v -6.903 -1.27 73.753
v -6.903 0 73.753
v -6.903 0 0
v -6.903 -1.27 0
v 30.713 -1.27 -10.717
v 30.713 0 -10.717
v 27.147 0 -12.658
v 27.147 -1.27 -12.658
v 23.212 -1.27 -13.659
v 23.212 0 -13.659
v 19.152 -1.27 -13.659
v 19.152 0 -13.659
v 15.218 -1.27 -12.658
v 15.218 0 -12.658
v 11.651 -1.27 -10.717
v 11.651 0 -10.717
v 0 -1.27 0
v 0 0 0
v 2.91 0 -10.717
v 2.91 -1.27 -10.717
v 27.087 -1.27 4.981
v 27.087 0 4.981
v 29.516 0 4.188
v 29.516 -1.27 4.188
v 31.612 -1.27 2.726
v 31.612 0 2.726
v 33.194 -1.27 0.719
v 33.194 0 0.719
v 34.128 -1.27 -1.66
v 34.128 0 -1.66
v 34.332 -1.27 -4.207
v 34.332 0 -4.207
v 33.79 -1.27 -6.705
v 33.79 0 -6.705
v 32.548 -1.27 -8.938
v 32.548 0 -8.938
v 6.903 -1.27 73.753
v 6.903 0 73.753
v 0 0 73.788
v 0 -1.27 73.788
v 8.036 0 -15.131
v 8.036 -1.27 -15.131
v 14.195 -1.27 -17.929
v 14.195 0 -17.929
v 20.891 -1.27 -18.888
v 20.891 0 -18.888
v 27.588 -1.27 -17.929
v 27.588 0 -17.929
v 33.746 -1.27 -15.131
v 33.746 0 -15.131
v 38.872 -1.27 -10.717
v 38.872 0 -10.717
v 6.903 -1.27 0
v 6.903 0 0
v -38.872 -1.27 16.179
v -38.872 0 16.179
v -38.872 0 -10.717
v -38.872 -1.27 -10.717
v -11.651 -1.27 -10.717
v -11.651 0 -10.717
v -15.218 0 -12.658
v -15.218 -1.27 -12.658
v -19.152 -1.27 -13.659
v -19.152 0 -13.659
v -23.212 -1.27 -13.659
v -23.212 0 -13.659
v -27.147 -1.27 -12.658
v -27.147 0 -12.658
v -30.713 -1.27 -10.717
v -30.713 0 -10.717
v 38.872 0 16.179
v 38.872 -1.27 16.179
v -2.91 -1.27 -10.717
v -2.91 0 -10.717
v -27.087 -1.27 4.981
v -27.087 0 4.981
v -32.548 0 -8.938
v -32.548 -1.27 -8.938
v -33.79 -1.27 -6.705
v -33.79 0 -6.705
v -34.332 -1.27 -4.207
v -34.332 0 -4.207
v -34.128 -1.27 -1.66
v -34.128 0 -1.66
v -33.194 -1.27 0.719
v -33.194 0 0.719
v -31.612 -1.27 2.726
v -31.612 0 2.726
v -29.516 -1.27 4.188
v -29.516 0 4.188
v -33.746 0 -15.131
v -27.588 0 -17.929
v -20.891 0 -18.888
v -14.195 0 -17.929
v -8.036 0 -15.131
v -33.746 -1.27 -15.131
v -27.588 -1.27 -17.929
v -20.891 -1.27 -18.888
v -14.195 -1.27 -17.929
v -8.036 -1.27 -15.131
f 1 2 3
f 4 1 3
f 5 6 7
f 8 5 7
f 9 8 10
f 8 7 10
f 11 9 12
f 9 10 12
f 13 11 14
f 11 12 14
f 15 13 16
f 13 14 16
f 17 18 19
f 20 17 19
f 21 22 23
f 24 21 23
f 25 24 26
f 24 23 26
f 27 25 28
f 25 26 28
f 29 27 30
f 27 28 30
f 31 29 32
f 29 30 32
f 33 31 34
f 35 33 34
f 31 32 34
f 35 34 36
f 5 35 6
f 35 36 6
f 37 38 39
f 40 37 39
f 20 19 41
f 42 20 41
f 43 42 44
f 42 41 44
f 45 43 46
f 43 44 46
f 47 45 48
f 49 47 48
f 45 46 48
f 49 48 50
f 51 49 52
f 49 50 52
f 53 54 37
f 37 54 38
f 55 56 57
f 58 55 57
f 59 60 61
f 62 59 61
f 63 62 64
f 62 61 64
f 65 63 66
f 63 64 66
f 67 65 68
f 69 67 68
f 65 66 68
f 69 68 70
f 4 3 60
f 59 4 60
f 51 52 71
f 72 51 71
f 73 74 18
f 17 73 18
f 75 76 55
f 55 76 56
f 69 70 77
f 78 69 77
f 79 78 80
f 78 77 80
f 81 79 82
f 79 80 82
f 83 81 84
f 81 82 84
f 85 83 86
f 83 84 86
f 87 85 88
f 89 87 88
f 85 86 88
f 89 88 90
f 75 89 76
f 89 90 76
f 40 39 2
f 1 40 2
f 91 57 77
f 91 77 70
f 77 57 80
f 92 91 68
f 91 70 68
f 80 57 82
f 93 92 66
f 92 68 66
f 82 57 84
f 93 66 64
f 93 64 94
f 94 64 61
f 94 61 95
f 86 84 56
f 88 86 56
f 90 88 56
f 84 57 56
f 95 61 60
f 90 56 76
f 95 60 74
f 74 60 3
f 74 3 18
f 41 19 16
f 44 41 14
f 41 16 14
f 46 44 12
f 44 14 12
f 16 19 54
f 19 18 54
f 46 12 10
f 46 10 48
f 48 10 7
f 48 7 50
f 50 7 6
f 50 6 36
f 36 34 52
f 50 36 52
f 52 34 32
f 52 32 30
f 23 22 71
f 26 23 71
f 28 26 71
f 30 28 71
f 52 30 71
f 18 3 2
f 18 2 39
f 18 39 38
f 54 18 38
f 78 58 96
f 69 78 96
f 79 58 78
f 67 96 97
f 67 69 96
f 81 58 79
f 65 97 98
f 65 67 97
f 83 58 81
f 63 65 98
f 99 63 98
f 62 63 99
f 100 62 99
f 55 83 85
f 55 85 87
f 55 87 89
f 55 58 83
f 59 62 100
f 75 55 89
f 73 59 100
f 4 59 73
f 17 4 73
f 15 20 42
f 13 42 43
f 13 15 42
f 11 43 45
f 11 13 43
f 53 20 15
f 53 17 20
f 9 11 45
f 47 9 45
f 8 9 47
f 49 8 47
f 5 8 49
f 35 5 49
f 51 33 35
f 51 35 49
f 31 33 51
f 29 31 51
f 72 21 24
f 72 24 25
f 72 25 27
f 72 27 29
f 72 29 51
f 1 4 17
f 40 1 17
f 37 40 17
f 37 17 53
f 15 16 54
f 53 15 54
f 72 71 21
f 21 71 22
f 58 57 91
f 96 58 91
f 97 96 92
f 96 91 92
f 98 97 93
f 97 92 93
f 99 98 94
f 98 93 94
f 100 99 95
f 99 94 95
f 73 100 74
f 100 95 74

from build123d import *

# Parameters (mm, degrees)
F1_DEPTH = 1.27


with BuildPart() as f1:
    # F0 (on Front) → F1 (new body)
    with BuildSketch(Plane.XZ):
        with BuildLine():
            Line((-2.910425, -10.716616), (0, 0))
            Line((0, 0), (0, 73.787502))
            Line((0, 73.787502), (-6.902514, 73.753235))
            Line((-6.902514, 73.753235), (-6.902514, 0))
            Line((-6.902514, 0), (-11.651456, -10.716616))
            ThreePointArc((-11.651456, -10.716616), (-21.18223, -13.785884), (-30.713003, -10.716616))
            ThreePointArc((-30.713003, -10.716616), (-34.127713, -1.660027), (-27.08658, 4.981095))
            Line((-27.08658, 4.981095), (-38.872454, 16.179355))
            Line((-38.872454, 16.179355), (-38.872454, -10.716616))
            ThreePointArc((-38.872454, -10.716616), (-20.89144, -18.888028), (-2.910425, -10.716616))
        make_face()
        with BuildLine():
            Line((0, 73.787502), (0, 0))
            Line((0, 0), (2.910425, -10.716616))
            ThreePointArc((2.910425, -10.716616), (20.89144, -18.888028), (38.872454, -10.716616))
            Line((38.872454, -10.716616), (38.872454, 16.179355))
            Line((38.872454, 16.179355), (27.08658, 4.981095))
            ThreePointArc((27.08658, 4.981095), (34.127713, -1.660027), (30.713003, -10.716616))
            ThreePointArc((30.713003, -10.716616), (21.18223, -13.785884), (11.651456, -10.716616))
            Line((11.651456, -10.716616), (6.902514, 0))
            Line((6.902514, 0), (6.902514, 73.753235))
            Line((6.902514, 73.753235), (0, 73.787502))
        make_face()
    extrude(amount=F1_DEPTH)


solid = f1.part
